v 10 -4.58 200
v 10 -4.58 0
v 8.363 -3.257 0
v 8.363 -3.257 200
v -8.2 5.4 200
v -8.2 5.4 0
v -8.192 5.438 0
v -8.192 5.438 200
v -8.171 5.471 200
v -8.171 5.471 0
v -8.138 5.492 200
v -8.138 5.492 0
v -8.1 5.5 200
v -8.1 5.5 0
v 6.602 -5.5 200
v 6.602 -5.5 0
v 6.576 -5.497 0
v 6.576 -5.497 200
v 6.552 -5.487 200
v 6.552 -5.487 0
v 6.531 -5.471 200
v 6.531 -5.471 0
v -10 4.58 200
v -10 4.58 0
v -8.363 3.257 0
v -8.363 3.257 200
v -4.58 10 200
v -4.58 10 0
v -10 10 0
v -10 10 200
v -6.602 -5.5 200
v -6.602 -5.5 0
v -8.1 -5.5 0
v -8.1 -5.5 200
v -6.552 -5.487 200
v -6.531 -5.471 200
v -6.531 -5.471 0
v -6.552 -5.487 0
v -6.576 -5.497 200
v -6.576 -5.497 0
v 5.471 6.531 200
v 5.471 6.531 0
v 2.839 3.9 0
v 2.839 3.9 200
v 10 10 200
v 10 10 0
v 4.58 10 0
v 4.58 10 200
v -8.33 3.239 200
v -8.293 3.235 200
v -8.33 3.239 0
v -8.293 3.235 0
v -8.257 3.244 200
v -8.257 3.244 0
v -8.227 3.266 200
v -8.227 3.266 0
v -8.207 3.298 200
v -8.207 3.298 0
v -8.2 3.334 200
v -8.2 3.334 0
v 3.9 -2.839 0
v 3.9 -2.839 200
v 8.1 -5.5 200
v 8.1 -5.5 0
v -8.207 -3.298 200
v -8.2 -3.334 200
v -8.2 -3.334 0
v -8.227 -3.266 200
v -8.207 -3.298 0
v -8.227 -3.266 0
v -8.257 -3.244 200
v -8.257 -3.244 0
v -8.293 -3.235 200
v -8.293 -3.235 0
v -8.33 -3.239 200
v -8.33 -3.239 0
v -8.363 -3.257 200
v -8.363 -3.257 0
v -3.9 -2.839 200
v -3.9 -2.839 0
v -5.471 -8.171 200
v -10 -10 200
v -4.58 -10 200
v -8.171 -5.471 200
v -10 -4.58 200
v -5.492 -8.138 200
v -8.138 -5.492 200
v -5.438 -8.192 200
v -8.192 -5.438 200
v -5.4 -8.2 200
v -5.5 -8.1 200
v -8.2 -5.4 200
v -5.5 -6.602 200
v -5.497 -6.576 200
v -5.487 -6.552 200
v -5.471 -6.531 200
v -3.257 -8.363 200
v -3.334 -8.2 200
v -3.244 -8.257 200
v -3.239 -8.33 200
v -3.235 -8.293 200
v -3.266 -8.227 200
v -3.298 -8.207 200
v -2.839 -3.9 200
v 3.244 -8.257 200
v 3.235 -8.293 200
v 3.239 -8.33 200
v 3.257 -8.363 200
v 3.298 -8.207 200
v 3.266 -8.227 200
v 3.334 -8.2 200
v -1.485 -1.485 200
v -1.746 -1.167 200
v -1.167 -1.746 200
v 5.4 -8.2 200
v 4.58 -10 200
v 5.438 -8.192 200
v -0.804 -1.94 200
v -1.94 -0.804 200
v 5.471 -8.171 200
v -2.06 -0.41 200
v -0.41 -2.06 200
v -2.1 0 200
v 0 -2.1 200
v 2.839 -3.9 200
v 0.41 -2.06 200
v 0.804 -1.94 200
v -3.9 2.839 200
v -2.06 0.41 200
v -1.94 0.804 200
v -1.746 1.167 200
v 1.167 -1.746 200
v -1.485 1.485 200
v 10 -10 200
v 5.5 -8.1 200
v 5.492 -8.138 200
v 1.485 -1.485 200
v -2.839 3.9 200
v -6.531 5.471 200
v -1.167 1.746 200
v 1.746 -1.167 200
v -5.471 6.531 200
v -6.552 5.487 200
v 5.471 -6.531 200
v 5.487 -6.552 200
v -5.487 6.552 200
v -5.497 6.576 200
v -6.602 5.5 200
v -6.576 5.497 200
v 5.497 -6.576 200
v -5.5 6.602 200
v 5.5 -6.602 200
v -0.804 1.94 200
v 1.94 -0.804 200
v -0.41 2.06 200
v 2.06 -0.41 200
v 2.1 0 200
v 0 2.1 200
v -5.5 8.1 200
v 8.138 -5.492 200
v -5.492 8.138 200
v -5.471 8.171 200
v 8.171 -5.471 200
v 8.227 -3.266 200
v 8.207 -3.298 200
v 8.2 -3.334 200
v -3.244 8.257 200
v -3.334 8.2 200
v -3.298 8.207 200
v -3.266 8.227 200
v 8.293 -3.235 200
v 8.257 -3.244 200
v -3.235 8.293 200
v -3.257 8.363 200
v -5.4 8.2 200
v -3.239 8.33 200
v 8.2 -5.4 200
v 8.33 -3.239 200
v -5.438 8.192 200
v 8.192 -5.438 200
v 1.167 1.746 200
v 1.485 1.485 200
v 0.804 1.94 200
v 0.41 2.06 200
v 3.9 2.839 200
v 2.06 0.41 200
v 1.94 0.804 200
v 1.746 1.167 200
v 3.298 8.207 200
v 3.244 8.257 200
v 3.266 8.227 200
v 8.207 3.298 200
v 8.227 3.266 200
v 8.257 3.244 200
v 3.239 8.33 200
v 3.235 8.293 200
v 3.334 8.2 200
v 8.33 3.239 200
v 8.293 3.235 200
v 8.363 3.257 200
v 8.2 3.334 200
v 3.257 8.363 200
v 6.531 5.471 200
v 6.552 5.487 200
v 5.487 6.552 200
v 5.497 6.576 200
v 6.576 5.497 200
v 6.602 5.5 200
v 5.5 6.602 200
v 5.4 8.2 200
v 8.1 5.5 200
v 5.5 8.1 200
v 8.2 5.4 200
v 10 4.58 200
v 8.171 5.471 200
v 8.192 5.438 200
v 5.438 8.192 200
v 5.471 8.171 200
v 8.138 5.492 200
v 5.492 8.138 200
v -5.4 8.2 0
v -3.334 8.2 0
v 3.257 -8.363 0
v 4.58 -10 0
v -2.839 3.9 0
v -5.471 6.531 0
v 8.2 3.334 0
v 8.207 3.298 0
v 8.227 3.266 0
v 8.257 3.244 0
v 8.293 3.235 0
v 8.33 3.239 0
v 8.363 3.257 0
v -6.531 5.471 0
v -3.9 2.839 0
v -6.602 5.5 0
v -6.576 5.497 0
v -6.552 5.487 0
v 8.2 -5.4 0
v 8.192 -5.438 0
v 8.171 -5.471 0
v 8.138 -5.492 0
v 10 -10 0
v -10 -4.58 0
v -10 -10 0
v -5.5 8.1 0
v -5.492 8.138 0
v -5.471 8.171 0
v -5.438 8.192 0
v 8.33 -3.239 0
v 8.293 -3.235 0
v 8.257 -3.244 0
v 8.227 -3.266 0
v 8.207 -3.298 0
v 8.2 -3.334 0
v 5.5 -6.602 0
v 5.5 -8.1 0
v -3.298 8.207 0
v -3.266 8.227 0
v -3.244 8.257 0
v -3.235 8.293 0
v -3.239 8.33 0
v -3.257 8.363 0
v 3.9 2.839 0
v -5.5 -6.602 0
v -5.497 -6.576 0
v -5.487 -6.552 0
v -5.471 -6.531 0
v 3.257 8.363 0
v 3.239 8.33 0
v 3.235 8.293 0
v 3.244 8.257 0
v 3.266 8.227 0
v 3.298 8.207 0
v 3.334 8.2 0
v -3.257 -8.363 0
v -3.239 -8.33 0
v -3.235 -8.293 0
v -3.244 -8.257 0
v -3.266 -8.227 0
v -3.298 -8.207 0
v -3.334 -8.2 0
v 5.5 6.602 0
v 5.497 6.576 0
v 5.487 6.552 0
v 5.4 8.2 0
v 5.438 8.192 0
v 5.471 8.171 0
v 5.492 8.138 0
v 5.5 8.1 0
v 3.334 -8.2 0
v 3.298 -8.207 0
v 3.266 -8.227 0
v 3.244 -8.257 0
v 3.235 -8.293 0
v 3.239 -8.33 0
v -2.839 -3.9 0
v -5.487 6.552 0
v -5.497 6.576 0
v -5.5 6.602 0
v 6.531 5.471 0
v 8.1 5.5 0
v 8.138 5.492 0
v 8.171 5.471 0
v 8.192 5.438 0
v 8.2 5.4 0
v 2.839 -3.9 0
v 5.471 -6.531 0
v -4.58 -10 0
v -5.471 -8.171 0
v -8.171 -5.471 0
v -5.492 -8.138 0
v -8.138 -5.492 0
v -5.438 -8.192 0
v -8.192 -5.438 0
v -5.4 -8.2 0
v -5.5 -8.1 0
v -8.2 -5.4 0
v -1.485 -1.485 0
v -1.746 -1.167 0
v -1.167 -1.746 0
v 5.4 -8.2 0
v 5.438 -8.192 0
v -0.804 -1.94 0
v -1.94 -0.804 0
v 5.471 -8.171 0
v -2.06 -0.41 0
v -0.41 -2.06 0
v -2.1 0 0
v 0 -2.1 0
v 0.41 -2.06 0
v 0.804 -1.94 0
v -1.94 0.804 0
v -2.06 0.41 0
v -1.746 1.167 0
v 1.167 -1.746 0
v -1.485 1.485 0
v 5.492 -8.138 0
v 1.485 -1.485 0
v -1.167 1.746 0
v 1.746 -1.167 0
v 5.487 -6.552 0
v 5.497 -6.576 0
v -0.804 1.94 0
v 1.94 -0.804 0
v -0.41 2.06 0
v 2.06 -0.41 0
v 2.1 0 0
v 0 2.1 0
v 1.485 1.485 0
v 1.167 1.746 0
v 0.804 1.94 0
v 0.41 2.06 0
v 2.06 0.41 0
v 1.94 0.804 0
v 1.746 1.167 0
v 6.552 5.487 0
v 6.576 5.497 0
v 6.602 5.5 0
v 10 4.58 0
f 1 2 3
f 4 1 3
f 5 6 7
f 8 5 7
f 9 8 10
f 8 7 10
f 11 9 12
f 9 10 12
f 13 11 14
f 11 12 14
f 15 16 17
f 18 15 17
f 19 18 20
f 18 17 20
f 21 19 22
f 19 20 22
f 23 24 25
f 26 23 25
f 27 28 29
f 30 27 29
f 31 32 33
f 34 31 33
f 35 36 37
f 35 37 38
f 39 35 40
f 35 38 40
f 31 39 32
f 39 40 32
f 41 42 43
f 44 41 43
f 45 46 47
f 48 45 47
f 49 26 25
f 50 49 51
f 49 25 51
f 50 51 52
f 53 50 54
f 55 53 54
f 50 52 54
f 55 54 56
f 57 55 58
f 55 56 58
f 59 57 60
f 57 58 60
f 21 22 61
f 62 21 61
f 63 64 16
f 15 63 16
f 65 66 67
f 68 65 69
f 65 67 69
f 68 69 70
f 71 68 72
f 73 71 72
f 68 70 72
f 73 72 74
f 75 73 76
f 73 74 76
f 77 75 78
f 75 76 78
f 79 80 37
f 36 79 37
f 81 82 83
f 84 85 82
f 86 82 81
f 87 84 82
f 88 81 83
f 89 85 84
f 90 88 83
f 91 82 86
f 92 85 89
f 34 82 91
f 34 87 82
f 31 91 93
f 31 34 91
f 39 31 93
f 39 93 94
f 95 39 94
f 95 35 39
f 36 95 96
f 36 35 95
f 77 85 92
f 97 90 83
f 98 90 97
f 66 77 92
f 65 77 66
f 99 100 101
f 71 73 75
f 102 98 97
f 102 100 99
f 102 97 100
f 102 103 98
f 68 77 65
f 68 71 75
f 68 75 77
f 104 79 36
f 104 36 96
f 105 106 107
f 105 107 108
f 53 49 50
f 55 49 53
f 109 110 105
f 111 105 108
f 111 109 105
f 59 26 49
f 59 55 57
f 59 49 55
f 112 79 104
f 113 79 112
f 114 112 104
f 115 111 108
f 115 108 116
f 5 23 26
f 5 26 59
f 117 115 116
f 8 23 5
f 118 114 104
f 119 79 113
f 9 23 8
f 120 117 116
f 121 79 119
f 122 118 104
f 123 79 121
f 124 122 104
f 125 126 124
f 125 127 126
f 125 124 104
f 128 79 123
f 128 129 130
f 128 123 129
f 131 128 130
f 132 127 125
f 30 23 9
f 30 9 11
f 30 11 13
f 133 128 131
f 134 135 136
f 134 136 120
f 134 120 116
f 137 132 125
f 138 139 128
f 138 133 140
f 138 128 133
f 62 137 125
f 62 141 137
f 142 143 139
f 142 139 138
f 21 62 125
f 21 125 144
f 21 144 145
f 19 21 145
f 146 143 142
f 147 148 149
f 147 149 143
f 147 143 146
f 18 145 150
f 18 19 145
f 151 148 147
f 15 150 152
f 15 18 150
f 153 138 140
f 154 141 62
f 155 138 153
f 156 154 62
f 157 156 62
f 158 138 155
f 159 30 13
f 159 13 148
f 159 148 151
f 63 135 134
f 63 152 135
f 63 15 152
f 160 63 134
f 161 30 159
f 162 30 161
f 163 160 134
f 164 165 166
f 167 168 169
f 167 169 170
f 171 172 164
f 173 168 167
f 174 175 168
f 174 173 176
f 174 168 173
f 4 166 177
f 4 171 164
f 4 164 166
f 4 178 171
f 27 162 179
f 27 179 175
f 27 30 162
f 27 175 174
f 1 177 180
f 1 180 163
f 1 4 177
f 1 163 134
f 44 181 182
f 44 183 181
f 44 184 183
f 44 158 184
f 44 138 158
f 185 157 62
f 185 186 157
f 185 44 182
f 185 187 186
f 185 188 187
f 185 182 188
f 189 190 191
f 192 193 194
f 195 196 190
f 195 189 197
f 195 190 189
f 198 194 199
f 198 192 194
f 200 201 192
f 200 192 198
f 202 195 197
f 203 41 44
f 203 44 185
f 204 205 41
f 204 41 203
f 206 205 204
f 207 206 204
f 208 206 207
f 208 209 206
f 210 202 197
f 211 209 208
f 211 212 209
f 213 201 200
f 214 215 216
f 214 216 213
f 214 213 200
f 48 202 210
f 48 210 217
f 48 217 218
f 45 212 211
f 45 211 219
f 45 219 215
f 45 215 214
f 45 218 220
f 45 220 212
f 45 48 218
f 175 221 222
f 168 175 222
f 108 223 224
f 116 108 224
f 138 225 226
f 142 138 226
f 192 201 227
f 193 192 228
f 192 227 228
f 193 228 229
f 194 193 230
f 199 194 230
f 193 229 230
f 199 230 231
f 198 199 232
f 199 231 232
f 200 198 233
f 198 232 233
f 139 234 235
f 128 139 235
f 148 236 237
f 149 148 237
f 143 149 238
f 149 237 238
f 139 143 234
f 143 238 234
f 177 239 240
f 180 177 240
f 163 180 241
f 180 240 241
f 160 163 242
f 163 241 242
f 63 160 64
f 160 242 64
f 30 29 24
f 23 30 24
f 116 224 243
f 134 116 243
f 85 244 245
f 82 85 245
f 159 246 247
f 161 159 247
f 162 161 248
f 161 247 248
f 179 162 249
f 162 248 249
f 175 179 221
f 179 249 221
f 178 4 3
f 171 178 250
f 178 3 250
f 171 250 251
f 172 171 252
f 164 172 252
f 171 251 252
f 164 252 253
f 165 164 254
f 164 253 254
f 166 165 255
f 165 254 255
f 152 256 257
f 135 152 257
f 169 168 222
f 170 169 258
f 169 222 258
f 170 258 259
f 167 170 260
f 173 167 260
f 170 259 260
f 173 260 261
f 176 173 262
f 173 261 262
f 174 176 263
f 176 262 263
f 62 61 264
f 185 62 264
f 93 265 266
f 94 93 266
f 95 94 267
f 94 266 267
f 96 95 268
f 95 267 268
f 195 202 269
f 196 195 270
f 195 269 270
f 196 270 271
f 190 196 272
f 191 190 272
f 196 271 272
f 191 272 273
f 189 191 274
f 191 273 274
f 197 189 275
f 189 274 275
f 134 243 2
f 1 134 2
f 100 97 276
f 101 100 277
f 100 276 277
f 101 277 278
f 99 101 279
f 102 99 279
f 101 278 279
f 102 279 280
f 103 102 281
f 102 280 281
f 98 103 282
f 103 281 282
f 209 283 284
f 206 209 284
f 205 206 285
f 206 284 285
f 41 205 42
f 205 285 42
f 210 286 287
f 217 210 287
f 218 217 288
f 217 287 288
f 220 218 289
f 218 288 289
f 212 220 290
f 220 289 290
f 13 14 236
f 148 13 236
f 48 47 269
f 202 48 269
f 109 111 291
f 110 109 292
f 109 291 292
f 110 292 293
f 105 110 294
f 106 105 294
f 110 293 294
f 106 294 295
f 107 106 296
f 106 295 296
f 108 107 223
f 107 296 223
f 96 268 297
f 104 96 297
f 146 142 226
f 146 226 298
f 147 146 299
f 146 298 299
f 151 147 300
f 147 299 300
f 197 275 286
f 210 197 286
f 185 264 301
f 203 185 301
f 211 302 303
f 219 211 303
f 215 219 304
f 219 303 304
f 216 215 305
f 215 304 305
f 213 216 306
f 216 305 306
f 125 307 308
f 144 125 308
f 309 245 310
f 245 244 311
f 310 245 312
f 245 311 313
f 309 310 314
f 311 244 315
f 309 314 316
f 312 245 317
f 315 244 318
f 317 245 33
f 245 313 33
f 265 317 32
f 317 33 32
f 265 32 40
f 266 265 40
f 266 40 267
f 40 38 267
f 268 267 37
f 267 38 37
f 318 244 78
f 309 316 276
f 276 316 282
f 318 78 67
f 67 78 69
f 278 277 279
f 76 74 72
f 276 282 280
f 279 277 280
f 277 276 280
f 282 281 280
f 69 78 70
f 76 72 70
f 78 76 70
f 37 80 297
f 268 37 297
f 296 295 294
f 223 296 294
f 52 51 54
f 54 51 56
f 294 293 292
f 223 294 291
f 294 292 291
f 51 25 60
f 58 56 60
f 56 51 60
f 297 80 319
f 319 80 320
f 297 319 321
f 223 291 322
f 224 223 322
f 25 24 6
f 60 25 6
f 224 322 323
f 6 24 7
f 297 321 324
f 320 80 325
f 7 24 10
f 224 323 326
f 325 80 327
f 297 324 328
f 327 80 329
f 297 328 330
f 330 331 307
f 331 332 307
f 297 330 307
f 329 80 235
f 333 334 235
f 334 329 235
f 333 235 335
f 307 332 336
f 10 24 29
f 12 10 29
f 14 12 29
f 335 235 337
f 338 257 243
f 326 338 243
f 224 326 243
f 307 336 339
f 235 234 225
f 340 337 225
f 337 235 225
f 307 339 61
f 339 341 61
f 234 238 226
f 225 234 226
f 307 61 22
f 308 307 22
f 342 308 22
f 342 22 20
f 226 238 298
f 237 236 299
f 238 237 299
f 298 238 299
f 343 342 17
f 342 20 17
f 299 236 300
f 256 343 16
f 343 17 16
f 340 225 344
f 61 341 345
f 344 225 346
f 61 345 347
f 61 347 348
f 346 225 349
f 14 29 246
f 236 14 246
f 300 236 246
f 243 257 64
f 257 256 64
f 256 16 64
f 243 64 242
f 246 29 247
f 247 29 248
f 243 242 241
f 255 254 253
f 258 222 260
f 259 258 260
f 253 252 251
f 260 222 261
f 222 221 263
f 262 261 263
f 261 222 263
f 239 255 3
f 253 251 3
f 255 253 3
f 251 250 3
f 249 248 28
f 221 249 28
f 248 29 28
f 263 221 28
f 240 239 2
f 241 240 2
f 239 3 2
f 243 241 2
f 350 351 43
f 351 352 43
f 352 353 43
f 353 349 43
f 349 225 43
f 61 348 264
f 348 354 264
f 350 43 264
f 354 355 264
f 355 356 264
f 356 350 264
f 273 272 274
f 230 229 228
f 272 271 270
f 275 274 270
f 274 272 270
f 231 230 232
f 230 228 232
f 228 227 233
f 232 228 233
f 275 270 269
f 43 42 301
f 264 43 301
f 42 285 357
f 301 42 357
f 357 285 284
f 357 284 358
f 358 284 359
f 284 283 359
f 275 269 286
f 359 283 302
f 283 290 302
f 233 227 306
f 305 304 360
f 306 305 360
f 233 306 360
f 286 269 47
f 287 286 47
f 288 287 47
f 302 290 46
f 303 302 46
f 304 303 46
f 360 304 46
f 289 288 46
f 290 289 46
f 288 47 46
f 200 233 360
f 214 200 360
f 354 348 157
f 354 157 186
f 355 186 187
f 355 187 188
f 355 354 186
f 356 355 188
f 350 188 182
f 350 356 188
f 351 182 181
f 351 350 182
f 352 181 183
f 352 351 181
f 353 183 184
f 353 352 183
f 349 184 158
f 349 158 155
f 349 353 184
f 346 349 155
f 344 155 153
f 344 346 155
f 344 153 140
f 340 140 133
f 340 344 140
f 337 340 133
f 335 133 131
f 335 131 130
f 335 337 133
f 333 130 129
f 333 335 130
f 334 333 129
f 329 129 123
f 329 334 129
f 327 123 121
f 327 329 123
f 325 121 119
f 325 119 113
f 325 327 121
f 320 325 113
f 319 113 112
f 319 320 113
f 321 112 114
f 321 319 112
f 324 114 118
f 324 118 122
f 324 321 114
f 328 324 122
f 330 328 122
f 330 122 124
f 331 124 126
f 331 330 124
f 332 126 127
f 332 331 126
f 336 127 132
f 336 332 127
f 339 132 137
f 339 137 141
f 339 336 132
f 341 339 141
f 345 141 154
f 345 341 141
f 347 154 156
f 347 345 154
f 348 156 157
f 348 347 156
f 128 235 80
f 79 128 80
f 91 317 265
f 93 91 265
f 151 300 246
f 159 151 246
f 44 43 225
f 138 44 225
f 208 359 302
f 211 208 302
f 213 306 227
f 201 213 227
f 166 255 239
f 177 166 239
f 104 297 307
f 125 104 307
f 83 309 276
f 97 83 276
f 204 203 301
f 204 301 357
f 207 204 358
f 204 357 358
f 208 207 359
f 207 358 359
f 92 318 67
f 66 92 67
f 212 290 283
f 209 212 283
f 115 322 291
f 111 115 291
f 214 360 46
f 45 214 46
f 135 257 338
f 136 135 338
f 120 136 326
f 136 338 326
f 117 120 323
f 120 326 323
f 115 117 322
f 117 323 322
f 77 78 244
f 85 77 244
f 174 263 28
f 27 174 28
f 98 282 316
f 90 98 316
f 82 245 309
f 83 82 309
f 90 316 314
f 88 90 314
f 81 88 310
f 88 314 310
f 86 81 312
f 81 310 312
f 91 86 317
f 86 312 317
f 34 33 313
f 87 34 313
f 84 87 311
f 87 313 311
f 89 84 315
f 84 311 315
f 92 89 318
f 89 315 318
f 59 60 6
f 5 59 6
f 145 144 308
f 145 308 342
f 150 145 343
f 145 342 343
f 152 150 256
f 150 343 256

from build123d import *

# Parameters (mm, degrees)
SKETCH1_R           = 2.1
BOSS_EXTRUDE1_DEPTH = 200


with BuildPart() as part:
    # Sketch1 → Boss-Extrude1 (new body)
    with BuildSketch(Plane.XY):
        with BuildLine():
            Line((-2.839339828, 3.9), (-5.470710678, 6.53137085))
            ThreePointArc((-5.470710678, 6.53137085), (-5.492387953, 6.563813185), (-5.5, 6.602081528))
            Line((-5.5, 6.602081528), (-5.5, 8.1))
            ThreePointArc((-5.5, 8.1), (-5.470710678, 8.170710678), (-5.4, 8.2))
            Line((-5.4, 8.2), (-3.334418044, 8.2))
            ThreePointArc((-3.334418044, 8.2), (-3.244178397, 8.256909326), (-3.2566483, 8.362863876))
            Line((-3.2566483, 8.362863876), (-4.58, 10))
            Line((-4.58, 10), (-10, 10))
            Line((-10, 10), (-10, 4.58))
            Line((-10, 4.58), (-8.362863876, 3.2566483))
            ThreePointArc((-8.362863876, 3.2566483), (-8.256909326, 3.244178397), (-8.2, 3.334418044))
            Line((-8.2, 3.334418044), (-8.2, 5.4))
            ThreePointArc((-8.2, 5.4), (-8.170710678, 5.470710678), (-8.1, 5.5))
            Line((-8.1, 5.5), (-6.602081528, 5.5))
            ThreePointArc((-6.602081528, 5.5), (-6.563813185, 5.492387953), (-6.53137085, 5.470710678))
            Line((-6.53137085, 5.470710678), (-3.9, 2.839339828))
            Line((-3.9, 2.839339828), (-3.9, -2.839339828))
            Line((-3.9, -2.839339828), (-6.53137085, -5.470710678))
            ThreePointArc((-6.53137085, -5.470710678), (-6.563813185, -5.492387953), (-6.602081528, -5.5))
            Line((-6.602081528, -5.5), (-8.1, -5.5))
            ThreePointArc((-8.1, -5.5), (-8.170710678, -5.470710678), (-8.2, -5.4))
            Line((-8.2, -5.4), (-8.2, -3.334418044))
            ThreePointArc((-8.2, -3.334418044), (-8.256909326, -3.244178397), (-8.362863876, -3.2566483))
            Line((-8.362863876, -3.2566483), (-10, -4.58))
            Line((-10, -4.58), (-10, -10))
            Line((-10, -10), (-4.58, -10))
            Line((-4.58, -10), (-3.2566483, -8.362863876))
            ThreePointArc((-3.2566483, -8.362863876), (-3.244178397, -8.256909326), (-3.334418044, -8.2))
            Line((-3.334418044, -8.2), (-5.4, -8.2))
            ThreePointArc((-5.4, -8.2), (-5.470710678, -8.170710678), (-5.5, -8.1))
            Line((-5.5, -8.1), (-5.5, -6.602081528))
            ThreePointArc((-5.5, -6.602081528), (-5.492387953, -6.563813185), (-5.470710678, -6.53137085))
            Line((-5.470710678, -6.53137085), (-2.839339828, -3.9))
            Line((-2.839339828, -3.9), (2.839339828, -3.9))
            Line((2.839339828, -3.9), (5.470710678, -6.53137085))
            ThreePointArc((5.470710678, -6.53137085), (5.492387953, -6.563813185), (5.5, -6.602081528))
            Line((5.5, -6.602081528), (5.5, -8.1))
            ThreePointArc((5.5, -8.1), (5.470710678, -8.170710678), (5.4, -8.2))
            Line((5.4, -8.2), (3.334418044, -8.2))
            ThreePointArc((3.334418044, -8.2), (3.244178397, -8.256909326), (3.2566483, -8.362863876))
            Line((3.2566483, -8.362863876), (4.58, -10))
            Line((4.58, -10), (10, -10))
            Line((10, -10), (10, -4.58))
            Line((10, -4.58), (8.362863876, -3.2566483))
            ThreePointArc((8.362863876, -3.2566483), (8.256909326, -3.244178397), (8.2, -3.334418044))
            Line((8.2, -3.334418044), (8.2, -5.4))
            ThreePointArc((8.2, -5.4), (8.170710678, -5.470710678), (8.1, -5.5))
            Line((8.1, -5.5), (6.602081528, -5.5))
            ThreePointArc((6.602081528, -5.5), (6.563813185, -5.492387953), (6.53137085, -5.470710678))
            Line((6.53137085, -5.470710678), (3.9, -2.839339828))
            Line((3.9, -2.839339828), (3.9, 2.839339828))
            Line((3.9, 2.839339828), (6.53137085, 5.470710678))
            ThreePointArc((6.53137085, 5.470710678), (6.563813185, 5.492387953), (6.602081528, 5.5))
            Line((6.602081528, 5.5), (8.1, 5.5))
            ThreePointArc((8.1, 5.5), (8.170710678, 5.470710678), (8.2, 5.4))
            Line((8.2, 5.4), (8.2, 3.334418044))
            ThreePointArc((8.2, 3.334418044), (8.256909326, 3.244178397), (8.362863876, 3.2566483))
            Line((8.362863876, 3.2566483), (10, 4.58))
            Line((10, 4.58), (10, 10))
            Line((10, 10), (4.58, 10))
            Line((4.58, 10), (3.2566483, 8.362863876))
            ThreePointArc((3.2566483, 8.362863876), (3.244178397, 8.256909326), (3.334418044, 8.2))
            Line((3.334418044, 8.2), (5.4, 8.2))
            ThreePointArc((5.4, 8.2), (5.470710678, 8.170710678), (5.5, 8.1))
            Line((5.5, 8.1), (5.5, 6.602081528))
            ThreePointArc((5.5, 6.602081528), (5.492387953, 6.563813185), (5.470710678, 6.53137085))
            Line((5.470710678, 6.53137085), (2.839339828, 3.9))
            Line((2.839339828, 3.9), (-2.839339828, 3.9))
        make_face()
        Circle(SKETCH1_R, mode=Mode.SUBTRACT)
    extrude(amount=BOSS_EXTRUDE1_DEPTH)


solid = part.part
